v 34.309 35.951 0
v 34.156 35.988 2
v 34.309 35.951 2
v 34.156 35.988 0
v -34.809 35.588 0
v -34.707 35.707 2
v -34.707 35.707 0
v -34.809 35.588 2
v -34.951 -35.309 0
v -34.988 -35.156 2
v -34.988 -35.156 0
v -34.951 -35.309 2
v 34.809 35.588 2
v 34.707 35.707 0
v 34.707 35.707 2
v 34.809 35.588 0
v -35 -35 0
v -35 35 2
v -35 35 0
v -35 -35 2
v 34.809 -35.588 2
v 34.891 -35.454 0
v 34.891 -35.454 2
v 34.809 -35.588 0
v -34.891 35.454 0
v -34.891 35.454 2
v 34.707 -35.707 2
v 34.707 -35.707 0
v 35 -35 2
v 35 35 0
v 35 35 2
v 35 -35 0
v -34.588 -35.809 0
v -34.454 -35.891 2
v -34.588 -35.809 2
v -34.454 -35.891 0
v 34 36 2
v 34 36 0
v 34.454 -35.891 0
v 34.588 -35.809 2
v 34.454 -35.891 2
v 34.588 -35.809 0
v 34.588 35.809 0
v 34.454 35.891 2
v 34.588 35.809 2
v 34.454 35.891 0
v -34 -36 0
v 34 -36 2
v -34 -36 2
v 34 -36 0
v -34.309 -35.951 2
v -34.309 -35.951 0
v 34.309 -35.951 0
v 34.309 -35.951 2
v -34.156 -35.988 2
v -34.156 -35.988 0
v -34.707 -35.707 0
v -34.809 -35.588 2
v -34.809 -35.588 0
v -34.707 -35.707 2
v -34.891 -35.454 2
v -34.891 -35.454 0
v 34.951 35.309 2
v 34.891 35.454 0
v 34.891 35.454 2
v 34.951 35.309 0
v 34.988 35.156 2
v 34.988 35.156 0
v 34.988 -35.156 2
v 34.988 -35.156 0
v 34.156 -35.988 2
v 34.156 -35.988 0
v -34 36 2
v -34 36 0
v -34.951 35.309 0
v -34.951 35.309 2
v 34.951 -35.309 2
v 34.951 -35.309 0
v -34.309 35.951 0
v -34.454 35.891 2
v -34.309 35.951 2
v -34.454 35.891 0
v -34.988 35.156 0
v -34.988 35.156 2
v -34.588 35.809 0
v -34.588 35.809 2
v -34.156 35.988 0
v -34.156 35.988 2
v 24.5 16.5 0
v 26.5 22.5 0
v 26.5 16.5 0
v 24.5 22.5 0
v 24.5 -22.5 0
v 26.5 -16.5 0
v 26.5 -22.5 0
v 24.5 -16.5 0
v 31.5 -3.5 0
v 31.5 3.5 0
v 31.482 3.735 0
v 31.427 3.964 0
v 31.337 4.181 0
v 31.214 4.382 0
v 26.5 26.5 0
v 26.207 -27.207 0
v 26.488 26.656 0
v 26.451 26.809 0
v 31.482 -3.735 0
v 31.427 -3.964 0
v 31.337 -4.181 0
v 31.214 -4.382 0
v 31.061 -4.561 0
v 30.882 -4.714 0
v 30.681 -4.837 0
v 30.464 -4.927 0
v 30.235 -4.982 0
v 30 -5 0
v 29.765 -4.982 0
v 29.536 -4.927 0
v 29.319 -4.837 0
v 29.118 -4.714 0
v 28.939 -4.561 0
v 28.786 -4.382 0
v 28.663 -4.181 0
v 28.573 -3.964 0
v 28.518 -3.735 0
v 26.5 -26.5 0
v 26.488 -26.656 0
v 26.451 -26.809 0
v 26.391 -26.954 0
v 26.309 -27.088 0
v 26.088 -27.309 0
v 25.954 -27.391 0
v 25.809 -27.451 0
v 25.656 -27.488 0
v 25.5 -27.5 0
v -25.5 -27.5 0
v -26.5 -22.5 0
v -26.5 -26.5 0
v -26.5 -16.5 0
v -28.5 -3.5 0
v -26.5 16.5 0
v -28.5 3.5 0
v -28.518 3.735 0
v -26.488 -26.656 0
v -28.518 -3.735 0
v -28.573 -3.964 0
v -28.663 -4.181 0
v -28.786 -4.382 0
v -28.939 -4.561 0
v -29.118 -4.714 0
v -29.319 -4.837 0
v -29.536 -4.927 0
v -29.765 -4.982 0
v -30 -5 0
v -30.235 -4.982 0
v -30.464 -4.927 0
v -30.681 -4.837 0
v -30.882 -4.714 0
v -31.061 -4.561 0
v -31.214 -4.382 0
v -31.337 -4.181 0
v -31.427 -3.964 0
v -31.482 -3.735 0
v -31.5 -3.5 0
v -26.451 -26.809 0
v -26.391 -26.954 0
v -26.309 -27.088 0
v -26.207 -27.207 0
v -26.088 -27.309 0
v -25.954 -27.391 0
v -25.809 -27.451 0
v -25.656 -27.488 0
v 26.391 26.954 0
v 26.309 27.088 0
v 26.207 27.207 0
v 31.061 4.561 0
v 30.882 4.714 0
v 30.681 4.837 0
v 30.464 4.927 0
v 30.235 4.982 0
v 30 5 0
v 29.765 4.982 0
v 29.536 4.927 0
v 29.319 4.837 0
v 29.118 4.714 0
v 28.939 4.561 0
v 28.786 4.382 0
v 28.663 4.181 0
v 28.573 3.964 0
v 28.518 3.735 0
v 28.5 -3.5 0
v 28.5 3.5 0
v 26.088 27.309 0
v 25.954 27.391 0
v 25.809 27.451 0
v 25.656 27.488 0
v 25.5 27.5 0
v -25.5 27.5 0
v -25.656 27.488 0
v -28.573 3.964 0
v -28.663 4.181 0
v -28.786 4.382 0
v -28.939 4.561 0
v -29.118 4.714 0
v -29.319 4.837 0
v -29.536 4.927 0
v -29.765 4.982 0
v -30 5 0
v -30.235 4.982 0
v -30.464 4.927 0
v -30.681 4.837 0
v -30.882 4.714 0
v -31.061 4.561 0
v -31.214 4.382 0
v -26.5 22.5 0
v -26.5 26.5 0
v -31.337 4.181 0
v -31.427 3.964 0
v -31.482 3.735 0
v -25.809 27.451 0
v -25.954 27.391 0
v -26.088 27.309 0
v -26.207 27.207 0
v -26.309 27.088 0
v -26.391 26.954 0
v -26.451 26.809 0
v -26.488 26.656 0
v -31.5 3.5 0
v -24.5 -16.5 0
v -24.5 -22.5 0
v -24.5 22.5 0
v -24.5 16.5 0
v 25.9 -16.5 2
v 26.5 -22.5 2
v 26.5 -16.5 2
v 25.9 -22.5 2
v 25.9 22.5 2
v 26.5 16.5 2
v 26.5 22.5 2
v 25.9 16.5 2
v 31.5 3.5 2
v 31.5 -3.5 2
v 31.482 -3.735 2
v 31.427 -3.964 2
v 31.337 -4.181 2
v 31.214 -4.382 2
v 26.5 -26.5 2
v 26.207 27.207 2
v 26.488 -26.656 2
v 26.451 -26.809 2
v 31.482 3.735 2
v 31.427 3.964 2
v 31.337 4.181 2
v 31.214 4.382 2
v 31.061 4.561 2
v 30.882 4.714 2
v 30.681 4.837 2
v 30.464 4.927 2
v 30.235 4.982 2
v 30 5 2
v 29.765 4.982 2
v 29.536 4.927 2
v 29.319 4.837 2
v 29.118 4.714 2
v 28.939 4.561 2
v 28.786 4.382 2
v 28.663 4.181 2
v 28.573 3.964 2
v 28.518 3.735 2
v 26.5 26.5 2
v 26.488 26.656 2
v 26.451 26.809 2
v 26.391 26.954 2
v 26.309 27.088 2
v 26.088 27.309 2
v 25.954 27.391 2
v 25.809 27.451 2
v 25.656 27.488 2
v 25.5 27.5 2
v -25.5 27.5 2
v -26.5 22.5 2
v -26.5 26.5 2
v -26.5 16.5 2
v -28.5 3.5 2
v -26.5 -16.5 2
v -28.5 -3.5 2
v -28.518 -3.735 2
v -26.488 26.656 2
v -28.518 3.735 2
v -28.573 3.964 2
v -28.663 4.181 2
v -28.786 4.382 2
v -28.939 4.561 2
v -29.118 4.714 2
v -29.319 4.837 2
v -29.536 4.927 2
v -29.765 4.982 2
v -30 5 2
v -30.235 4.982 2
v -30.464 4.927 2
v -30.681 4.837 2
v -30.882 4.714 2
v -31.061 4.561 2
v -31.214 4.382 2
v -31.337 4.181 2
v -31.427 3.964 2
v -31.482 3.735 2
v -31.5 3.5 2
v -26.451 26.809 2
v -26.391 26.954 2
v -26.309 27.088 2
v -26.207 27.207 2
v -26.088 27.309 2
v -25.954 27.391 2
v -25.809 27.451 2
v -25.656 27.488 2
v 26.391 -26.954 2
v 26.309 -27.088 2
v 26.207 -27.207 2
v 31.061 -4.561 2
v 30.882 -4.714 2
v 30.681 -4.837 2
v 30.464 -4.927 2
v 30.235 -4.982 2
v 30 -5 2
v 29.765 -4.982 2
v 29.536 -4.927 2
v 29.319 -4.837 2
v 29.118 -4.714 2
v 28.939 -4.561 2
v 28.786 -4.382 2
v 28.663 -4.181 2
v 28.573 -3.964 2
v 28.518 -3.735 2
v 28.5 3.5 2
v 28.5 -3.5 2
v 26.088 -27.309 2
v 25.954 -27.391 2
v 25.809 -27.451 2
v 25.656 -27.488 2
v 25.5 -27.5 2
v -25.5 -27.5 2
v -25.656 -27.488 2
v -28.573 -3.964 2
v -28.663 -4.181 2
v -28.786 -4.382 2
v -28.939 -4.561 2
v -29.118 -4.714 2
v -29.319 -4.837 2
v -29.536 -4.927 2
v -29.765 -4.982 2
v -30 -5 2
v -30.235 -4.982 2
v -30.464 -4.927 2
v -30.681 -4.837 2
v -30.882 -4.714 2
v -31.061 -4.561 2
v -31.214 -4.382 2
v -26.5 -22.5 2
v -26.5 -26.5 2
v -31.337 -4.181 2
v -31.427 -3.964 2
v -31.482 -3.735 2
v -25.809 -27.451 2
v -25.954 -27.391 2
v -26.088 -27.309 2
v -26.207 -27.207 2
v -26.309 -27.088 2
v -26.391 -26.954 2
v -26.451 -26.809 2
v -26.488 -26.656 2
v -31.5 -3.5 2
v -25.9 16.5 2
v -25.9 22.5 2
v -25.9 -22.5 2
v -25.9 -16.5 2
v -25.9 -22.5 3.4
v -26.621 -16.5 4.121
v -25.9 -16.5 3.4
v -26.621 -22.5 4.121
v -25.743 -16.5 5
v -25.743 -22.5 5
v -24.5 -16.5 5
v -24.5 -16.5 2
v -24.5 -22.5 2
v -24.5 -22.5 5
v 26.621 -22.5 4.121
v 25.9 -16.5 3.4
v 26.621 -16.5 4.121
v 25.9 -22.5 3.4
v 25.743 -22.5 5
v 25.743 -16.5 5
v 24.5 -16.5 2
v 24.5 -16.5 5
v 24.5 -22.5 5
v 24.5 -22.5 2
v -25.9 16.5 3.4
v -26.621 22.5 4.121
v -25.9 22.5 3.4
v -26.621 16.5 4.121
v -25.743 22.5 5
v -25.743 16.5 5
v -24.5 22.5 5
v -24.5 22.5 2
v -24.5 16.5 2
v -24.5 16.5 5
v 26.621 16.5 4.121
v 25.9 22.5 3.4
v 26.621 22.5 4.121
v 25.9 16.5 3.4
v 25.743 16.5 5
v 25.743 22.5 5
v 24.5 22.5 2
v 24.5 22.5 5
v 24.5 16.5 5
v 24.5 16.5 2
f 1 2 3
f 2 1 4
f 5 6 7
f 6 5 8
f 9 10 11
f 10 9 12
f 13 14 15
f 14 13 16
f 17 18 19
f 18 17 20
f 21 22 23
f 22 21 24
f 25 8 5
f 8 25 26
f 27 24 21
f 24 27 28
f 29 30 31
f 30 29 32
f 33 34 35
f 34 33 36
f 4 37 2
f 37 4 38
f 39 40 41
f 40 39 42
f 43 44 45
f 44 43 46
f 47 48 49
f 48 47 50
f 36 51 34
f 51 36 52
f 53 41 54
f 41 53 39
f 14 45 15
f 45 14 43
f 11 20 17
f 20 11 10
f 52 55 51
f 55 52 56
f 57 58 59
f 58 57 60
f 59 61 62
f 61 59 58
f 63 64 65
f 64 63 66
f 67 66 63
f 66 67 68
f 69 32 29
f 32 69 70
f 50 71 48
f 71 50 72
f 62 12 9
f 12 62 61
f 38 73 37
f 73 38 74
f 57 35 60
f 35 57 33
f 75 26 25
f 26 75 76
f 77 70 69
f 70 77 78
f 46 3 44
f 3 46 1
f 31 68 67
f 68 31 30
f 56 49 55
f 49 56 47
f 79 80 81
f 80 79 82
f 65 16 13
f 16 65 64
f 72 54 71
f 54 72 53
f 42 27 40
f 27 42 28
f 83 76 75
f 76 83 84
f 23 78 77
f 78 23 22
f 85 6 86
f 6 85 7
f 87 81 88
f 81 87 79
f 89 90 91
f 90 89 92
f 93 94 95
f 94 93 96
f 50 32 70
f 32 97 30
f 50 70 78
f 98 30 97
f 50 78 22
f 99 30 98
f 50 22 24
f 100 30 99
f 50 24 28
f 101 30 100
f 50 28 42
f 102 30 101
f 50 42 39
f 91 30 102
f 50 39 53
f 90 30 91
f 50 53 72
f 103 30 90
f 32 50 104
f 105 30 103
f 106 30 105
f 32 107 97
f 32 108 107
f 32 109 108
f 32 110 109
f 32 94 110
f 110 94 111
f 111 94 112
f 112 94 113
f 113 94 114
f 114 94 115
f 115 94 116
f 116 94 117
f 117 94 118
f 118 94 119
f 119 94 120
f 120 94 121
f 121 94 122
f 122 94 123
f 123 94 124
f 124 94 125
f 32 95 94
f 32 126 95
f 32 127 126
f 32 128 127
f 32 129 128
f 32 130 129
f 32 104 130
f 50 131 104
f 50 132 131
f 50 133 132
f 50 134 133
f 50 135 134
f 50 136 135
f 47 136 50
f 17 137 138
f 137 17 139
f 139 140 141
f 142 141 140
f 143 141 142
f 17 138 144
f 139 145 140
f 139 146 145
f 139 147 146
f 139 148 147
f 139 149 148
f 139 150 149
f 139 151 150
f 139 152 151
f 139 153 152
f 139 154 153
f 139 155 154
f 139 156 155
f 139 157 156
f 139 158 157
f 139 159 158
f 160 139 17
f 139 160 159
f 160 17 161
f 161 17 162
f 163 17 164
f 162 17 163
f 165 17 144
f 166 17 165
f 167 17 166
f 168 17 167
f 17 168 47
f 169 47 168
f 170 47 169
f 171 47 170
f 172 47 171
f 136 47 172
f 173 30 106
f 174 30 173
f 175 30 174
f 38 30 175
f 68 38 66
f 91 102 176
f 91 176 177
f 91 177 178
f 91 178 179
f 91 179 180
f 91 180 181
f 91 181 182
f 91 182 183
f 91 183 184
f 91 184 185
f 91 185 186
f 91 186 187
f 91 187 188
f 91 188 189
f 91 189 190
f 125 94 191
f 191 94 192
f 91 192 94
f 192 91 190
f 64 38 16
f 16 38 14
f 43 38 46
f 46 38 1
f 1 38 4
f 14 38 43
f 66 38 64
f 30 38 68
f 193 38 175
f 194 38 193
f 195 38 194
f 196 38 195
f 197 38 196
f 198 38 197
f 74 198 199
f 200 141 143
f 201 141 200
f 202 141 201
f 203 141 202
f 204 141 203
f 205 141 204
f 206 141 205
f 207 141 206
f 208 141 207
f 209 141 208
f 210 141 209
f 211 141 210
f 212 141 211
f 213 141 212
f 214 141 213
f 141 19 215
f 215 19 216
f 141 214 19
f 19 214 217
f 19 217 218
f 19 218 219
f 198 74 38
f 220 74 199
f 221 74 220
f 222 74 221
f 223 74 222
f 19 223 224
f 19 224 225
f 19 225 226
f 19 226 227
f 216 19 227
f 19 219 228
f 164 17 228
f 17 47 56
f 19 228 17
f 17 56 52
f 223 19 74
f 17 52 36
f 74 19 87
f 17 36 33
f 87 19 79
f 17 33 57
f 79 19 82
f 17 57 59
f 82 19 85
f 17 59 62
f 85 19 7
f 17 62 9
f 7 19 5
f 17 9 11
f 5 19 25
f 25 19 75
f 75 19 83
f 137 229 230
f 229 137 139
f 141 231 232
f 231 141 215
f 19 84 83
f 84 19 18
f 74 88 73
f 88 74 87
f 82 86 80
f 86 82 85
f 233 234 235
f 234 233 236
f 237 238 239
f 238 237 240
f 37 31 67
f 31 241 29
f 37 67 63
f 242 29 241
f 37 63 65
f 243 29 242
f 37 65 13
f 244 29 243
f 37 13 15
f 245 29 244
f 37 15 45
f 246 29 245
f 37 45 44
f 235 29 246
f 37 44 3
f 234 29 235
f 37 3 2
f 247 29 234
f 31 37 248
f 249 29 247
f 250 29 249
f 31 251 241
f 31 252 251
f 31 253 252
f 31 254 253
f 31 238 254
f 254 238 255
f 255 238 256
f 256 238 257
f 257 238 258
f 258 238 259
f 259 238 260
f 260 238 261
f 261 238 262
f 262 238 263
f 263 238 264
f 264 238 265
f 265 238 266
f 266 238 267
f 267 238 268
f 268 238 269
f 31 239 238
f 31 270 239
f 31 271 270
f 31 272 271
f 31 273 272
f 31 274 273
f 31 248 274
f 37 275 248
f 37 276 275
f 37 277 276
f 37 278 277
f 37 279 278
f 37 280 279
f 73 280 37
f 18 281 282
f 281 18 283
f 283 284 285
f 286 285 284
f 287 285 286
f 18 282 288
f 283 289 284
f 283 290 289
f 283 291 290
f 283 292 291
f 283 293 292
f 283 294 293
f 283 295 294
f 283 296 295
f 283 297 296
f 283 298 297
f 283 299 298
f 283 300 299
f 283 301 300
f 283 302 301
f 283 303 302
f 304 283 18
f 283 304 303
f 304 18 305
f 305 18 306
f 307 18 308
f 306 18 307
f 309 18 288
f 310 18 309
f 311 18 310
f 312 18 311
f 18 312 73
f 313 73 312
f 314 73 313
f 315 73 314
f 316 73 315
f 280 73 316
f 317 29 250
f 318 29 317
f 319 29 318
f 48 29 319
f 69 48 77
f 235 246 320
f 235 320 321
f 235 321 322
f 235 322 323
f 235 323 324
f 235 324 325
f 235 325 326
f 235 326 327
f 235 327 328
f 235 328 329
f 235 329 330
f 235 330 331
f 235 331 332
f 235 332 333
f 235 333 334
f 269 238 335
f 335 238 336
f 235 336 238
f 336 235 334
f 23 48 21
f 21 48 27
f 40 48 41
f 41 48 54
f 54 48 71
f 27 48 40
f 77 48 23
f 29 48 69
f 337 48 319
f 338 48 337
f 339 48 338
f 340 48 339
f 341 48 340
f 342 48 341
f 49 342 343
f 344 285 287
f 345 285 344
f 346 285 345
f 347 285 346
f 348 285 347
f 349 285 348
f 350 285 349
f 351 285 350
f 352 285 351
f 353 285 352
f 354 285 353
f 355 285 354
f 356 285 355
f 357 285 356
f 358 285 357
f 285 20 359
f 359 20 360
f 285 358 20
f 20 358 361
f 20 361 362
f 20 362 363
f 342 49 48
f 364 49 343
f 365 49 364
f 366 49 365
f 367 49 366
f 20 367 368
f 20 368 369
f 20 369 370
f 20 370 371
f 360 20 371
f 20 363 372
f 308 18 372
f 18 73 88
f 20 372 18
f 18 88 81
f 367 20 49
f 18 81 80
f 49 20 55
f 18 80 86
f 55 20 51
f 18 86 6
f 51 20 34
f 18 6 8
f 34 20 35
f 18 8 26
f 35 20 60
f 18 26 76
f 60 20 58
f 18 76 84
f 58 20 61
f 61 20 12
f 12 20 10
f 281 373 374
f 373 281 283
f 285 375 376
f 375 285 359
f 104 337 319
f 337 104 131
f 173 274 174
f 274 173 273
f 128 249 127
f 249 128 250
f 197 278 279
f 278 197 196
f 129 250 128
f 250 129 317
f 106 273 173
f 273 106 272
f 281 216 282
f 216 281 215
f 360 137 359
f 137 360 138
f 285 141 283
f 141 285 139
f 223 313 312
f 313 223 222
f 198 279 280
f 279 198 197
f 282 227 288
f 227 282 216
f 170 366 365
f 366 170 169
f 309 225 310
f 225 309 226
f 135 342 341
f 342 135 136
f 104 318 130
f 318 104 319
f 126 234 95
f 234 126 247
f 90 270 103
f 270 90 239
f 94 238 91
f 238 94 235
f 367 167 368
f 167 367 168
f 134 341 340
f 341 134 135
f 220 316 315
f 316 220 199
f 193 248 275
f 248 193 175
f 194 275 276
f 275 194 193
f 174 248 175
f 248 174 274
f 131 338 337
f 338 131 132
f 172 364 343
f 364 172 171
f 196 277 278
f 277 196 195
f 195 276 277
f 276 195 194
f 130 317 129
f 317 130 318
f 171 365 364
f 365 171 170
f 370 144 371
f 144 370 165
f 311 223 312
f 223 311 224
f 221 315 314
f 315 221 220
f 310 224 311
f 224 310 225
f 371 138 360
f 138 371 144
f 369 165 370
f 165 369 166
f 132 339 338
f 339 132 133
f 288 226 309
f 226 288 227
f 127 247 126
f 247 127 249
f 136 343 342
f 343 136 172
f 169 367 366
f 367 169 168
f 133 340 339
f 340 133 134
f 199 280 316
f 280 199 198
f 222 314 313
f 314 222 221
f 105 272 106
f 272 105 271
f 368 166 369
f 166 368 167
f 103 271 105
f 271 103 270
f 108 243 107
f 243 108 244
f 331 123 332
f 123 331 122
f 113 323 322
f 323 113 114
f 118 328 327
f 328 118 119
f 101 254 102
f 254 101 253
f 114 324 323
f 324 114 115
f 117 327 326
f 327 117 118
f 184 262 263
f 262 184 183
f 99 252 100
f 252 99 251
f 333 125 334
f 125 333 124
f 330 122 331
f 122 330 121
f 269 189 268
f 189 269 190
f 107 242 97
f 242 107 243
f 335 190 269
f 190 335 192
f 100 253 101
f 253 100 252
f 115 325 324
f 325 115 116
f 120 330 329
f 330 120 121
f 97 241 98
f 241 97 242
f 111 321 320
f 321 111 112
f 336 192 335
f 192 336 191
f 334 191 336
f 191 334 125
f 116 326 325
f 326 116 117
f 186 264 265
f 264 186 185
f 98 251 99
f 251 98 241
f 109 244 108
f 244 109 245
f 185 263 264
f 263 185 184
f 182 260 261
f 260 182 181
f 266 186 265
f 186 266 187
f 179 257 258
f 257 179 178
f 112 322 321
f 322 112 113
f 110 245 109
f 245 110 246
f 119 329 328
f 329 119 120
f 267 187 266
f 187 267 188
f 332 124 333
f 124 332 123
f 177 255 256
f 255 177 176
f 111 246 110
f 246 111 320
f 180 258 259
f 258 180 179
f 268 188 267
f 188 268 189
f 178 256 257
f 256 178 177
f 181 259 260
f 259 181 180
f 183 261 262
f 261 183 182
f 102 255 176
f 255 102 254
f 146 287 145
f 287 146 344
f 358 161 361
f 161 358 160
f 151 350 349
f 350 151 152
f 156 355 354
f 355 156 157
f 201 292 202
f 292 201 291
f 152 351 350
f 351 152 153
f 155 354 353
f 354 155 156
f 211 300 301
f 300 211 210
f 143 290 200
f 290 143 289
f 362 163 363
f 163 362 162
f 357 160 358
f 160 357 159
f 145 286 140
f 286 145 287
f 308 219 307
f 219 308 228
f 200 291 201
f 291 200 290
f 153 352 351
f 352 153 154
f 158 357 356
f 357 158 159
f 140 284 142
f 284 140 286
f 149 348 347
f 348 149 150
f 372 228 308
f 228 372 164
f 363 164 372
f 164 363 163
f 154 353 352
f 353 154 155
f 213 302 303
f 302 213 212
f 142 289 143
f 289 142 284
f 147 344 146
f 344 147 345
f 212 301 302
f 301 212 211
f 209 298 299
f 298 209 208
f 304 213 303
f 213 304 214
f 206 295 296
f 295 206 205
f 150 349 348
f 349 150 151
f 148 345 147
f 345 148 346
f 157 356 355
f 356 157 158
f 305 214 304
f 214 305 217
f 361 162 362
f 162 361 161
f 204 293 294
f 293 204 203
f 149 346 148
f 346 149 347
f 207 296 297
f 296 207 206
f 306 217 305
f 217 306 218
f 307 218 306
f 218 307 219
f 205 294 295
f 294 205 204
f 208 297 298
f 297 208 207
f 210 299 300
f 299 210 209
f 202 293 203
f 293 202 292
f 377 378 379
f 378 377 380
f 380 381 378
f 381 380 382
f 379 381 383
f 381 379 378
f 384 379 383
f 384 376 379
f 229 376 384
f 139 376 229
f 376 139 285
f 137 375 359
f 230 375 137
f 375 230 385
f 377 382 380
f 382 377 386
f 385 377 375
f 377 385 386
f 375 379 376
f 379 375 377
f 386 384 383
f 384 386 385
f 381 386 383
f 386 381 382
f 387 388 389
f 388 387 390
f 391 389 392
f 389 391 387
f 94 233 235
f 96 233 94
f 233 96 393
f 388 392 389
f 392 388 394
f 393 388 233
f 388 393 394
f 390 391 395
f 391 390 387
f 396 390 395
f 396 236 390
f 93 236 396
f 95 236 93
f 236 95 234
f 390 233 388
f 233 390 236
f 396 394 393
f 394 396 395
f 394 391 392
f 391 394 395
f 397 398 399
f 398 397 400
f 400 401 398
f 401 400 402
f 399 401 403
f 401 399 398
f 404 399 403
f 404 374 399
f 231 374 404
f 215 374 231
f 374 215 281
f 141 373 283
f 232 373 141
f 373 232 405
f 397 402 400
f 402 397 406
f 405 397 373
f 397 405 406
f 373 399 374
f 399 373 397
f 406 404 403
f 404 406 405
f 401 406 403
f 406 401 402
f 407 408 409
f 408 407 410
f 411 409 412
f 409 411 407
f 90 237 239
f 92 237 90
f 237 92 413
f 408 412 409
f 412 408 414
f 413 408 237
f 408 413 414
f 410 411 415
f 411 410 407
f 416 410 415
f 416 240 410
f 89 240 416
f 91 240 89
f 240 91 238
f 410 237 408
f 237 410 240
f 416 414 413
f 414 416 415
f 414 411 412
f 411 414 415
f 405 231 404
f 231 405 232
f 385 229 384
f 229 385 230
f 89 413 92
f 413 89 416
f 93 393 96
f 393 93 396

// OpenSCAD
$fn=40;
outer_x = 70;
outer_y = 72;
inner_x = 53;
inner_y = 55;
radius = 1;
t=2;
spacer=9;

module base(outer_x,outer_y,t,radius) {
    hull() {
        translate([-outer_x/2+1,-outer_y/2+1,0]) cylinder(r=radius, h=t);
        translate([-outer_x/2+1,outer_y/2-1,0]) cylinder(r=radius, h=t);
        translate([outer_x/2-1,outer_y/2-1,0]) cylinder(r=radius, h=t);
        translate([outer_x/2-1,-outer_y/2+1,0]) cylinder(r=radius, h=t);
    }
}

module side_clip_hook(clamp_edge, length=20)
{
    difference() {
       union () {
    fill_cube_side= sqrt(clamp_edge*clamp_edge*2)/2;
    translate([0,0,fill_cube_side]) {
        rotate([0,45,0]) translate([-clamp_edge/2,-length/2,-clamp_edge/2]) cube([clamp_edge,length,clamp_edge]);
        translate([0,-length/2,0]) cube([fill_cube_side,length,fill_cube_side]);
    }
    translate([-1.4,(-length)/2,0]) cube([3,length,2]);
    }
    translate([0,-length/2,0]) cube([10,length,10]);
    translate([-4,-length/2,3]) cube([10,length,10]);
}
}

module side_clips(clamp_edge=3,length=20) {
    translate([-49.0/2,0,t]) {
        side_clip_hook(3, length);
    }
    translate([49.0/2,0,t]) {
        mirror([1,0,0]) side_clip_hook(3, length);
    }
}

module mounting_slot(r2,r,h,w) {
    hull() {
    translate([0,w/2-r,0]) cylinder(r=r,h=h);
    translate([0,-w/2+r,0]) cylinder(r=r,h=h);
    }
}

difference() {
    //round corner cube (plate)
    union() {
        difference() {
            base(outer_x,outer_y,t,radius);
            base(inner_x,inner_y,t,radius);
            translate([30,0,0]) mounting_slot(5/2,3/2,t,10);
            translate([-30,0,0])mounting_slot(5/2,3/2,t,10);
        }
        translate([-inner_x/2-1.0,3+16.5,0]) translate([-3,-3,0]) cube([6,6,t]);
        translate([-inner_x/2-1.0,-(3+16.5),0]) translate([-3,-3,0]) cube([6,6,t]);
        translate([inner_x/2+1.0,3+16.5,0]) translate([-3,-3,0]) cube([6,6,t]);
        translate([inner_x/2+1.0,-(3+16.5),0]) translate([-3,-3,0]) cube([6,6,t]);
        translate([0,-3-16.5,0]) side_clips(length=6);
        translate([0,+3+16.5,0]) side_clips(length=6);
        
    }
}
